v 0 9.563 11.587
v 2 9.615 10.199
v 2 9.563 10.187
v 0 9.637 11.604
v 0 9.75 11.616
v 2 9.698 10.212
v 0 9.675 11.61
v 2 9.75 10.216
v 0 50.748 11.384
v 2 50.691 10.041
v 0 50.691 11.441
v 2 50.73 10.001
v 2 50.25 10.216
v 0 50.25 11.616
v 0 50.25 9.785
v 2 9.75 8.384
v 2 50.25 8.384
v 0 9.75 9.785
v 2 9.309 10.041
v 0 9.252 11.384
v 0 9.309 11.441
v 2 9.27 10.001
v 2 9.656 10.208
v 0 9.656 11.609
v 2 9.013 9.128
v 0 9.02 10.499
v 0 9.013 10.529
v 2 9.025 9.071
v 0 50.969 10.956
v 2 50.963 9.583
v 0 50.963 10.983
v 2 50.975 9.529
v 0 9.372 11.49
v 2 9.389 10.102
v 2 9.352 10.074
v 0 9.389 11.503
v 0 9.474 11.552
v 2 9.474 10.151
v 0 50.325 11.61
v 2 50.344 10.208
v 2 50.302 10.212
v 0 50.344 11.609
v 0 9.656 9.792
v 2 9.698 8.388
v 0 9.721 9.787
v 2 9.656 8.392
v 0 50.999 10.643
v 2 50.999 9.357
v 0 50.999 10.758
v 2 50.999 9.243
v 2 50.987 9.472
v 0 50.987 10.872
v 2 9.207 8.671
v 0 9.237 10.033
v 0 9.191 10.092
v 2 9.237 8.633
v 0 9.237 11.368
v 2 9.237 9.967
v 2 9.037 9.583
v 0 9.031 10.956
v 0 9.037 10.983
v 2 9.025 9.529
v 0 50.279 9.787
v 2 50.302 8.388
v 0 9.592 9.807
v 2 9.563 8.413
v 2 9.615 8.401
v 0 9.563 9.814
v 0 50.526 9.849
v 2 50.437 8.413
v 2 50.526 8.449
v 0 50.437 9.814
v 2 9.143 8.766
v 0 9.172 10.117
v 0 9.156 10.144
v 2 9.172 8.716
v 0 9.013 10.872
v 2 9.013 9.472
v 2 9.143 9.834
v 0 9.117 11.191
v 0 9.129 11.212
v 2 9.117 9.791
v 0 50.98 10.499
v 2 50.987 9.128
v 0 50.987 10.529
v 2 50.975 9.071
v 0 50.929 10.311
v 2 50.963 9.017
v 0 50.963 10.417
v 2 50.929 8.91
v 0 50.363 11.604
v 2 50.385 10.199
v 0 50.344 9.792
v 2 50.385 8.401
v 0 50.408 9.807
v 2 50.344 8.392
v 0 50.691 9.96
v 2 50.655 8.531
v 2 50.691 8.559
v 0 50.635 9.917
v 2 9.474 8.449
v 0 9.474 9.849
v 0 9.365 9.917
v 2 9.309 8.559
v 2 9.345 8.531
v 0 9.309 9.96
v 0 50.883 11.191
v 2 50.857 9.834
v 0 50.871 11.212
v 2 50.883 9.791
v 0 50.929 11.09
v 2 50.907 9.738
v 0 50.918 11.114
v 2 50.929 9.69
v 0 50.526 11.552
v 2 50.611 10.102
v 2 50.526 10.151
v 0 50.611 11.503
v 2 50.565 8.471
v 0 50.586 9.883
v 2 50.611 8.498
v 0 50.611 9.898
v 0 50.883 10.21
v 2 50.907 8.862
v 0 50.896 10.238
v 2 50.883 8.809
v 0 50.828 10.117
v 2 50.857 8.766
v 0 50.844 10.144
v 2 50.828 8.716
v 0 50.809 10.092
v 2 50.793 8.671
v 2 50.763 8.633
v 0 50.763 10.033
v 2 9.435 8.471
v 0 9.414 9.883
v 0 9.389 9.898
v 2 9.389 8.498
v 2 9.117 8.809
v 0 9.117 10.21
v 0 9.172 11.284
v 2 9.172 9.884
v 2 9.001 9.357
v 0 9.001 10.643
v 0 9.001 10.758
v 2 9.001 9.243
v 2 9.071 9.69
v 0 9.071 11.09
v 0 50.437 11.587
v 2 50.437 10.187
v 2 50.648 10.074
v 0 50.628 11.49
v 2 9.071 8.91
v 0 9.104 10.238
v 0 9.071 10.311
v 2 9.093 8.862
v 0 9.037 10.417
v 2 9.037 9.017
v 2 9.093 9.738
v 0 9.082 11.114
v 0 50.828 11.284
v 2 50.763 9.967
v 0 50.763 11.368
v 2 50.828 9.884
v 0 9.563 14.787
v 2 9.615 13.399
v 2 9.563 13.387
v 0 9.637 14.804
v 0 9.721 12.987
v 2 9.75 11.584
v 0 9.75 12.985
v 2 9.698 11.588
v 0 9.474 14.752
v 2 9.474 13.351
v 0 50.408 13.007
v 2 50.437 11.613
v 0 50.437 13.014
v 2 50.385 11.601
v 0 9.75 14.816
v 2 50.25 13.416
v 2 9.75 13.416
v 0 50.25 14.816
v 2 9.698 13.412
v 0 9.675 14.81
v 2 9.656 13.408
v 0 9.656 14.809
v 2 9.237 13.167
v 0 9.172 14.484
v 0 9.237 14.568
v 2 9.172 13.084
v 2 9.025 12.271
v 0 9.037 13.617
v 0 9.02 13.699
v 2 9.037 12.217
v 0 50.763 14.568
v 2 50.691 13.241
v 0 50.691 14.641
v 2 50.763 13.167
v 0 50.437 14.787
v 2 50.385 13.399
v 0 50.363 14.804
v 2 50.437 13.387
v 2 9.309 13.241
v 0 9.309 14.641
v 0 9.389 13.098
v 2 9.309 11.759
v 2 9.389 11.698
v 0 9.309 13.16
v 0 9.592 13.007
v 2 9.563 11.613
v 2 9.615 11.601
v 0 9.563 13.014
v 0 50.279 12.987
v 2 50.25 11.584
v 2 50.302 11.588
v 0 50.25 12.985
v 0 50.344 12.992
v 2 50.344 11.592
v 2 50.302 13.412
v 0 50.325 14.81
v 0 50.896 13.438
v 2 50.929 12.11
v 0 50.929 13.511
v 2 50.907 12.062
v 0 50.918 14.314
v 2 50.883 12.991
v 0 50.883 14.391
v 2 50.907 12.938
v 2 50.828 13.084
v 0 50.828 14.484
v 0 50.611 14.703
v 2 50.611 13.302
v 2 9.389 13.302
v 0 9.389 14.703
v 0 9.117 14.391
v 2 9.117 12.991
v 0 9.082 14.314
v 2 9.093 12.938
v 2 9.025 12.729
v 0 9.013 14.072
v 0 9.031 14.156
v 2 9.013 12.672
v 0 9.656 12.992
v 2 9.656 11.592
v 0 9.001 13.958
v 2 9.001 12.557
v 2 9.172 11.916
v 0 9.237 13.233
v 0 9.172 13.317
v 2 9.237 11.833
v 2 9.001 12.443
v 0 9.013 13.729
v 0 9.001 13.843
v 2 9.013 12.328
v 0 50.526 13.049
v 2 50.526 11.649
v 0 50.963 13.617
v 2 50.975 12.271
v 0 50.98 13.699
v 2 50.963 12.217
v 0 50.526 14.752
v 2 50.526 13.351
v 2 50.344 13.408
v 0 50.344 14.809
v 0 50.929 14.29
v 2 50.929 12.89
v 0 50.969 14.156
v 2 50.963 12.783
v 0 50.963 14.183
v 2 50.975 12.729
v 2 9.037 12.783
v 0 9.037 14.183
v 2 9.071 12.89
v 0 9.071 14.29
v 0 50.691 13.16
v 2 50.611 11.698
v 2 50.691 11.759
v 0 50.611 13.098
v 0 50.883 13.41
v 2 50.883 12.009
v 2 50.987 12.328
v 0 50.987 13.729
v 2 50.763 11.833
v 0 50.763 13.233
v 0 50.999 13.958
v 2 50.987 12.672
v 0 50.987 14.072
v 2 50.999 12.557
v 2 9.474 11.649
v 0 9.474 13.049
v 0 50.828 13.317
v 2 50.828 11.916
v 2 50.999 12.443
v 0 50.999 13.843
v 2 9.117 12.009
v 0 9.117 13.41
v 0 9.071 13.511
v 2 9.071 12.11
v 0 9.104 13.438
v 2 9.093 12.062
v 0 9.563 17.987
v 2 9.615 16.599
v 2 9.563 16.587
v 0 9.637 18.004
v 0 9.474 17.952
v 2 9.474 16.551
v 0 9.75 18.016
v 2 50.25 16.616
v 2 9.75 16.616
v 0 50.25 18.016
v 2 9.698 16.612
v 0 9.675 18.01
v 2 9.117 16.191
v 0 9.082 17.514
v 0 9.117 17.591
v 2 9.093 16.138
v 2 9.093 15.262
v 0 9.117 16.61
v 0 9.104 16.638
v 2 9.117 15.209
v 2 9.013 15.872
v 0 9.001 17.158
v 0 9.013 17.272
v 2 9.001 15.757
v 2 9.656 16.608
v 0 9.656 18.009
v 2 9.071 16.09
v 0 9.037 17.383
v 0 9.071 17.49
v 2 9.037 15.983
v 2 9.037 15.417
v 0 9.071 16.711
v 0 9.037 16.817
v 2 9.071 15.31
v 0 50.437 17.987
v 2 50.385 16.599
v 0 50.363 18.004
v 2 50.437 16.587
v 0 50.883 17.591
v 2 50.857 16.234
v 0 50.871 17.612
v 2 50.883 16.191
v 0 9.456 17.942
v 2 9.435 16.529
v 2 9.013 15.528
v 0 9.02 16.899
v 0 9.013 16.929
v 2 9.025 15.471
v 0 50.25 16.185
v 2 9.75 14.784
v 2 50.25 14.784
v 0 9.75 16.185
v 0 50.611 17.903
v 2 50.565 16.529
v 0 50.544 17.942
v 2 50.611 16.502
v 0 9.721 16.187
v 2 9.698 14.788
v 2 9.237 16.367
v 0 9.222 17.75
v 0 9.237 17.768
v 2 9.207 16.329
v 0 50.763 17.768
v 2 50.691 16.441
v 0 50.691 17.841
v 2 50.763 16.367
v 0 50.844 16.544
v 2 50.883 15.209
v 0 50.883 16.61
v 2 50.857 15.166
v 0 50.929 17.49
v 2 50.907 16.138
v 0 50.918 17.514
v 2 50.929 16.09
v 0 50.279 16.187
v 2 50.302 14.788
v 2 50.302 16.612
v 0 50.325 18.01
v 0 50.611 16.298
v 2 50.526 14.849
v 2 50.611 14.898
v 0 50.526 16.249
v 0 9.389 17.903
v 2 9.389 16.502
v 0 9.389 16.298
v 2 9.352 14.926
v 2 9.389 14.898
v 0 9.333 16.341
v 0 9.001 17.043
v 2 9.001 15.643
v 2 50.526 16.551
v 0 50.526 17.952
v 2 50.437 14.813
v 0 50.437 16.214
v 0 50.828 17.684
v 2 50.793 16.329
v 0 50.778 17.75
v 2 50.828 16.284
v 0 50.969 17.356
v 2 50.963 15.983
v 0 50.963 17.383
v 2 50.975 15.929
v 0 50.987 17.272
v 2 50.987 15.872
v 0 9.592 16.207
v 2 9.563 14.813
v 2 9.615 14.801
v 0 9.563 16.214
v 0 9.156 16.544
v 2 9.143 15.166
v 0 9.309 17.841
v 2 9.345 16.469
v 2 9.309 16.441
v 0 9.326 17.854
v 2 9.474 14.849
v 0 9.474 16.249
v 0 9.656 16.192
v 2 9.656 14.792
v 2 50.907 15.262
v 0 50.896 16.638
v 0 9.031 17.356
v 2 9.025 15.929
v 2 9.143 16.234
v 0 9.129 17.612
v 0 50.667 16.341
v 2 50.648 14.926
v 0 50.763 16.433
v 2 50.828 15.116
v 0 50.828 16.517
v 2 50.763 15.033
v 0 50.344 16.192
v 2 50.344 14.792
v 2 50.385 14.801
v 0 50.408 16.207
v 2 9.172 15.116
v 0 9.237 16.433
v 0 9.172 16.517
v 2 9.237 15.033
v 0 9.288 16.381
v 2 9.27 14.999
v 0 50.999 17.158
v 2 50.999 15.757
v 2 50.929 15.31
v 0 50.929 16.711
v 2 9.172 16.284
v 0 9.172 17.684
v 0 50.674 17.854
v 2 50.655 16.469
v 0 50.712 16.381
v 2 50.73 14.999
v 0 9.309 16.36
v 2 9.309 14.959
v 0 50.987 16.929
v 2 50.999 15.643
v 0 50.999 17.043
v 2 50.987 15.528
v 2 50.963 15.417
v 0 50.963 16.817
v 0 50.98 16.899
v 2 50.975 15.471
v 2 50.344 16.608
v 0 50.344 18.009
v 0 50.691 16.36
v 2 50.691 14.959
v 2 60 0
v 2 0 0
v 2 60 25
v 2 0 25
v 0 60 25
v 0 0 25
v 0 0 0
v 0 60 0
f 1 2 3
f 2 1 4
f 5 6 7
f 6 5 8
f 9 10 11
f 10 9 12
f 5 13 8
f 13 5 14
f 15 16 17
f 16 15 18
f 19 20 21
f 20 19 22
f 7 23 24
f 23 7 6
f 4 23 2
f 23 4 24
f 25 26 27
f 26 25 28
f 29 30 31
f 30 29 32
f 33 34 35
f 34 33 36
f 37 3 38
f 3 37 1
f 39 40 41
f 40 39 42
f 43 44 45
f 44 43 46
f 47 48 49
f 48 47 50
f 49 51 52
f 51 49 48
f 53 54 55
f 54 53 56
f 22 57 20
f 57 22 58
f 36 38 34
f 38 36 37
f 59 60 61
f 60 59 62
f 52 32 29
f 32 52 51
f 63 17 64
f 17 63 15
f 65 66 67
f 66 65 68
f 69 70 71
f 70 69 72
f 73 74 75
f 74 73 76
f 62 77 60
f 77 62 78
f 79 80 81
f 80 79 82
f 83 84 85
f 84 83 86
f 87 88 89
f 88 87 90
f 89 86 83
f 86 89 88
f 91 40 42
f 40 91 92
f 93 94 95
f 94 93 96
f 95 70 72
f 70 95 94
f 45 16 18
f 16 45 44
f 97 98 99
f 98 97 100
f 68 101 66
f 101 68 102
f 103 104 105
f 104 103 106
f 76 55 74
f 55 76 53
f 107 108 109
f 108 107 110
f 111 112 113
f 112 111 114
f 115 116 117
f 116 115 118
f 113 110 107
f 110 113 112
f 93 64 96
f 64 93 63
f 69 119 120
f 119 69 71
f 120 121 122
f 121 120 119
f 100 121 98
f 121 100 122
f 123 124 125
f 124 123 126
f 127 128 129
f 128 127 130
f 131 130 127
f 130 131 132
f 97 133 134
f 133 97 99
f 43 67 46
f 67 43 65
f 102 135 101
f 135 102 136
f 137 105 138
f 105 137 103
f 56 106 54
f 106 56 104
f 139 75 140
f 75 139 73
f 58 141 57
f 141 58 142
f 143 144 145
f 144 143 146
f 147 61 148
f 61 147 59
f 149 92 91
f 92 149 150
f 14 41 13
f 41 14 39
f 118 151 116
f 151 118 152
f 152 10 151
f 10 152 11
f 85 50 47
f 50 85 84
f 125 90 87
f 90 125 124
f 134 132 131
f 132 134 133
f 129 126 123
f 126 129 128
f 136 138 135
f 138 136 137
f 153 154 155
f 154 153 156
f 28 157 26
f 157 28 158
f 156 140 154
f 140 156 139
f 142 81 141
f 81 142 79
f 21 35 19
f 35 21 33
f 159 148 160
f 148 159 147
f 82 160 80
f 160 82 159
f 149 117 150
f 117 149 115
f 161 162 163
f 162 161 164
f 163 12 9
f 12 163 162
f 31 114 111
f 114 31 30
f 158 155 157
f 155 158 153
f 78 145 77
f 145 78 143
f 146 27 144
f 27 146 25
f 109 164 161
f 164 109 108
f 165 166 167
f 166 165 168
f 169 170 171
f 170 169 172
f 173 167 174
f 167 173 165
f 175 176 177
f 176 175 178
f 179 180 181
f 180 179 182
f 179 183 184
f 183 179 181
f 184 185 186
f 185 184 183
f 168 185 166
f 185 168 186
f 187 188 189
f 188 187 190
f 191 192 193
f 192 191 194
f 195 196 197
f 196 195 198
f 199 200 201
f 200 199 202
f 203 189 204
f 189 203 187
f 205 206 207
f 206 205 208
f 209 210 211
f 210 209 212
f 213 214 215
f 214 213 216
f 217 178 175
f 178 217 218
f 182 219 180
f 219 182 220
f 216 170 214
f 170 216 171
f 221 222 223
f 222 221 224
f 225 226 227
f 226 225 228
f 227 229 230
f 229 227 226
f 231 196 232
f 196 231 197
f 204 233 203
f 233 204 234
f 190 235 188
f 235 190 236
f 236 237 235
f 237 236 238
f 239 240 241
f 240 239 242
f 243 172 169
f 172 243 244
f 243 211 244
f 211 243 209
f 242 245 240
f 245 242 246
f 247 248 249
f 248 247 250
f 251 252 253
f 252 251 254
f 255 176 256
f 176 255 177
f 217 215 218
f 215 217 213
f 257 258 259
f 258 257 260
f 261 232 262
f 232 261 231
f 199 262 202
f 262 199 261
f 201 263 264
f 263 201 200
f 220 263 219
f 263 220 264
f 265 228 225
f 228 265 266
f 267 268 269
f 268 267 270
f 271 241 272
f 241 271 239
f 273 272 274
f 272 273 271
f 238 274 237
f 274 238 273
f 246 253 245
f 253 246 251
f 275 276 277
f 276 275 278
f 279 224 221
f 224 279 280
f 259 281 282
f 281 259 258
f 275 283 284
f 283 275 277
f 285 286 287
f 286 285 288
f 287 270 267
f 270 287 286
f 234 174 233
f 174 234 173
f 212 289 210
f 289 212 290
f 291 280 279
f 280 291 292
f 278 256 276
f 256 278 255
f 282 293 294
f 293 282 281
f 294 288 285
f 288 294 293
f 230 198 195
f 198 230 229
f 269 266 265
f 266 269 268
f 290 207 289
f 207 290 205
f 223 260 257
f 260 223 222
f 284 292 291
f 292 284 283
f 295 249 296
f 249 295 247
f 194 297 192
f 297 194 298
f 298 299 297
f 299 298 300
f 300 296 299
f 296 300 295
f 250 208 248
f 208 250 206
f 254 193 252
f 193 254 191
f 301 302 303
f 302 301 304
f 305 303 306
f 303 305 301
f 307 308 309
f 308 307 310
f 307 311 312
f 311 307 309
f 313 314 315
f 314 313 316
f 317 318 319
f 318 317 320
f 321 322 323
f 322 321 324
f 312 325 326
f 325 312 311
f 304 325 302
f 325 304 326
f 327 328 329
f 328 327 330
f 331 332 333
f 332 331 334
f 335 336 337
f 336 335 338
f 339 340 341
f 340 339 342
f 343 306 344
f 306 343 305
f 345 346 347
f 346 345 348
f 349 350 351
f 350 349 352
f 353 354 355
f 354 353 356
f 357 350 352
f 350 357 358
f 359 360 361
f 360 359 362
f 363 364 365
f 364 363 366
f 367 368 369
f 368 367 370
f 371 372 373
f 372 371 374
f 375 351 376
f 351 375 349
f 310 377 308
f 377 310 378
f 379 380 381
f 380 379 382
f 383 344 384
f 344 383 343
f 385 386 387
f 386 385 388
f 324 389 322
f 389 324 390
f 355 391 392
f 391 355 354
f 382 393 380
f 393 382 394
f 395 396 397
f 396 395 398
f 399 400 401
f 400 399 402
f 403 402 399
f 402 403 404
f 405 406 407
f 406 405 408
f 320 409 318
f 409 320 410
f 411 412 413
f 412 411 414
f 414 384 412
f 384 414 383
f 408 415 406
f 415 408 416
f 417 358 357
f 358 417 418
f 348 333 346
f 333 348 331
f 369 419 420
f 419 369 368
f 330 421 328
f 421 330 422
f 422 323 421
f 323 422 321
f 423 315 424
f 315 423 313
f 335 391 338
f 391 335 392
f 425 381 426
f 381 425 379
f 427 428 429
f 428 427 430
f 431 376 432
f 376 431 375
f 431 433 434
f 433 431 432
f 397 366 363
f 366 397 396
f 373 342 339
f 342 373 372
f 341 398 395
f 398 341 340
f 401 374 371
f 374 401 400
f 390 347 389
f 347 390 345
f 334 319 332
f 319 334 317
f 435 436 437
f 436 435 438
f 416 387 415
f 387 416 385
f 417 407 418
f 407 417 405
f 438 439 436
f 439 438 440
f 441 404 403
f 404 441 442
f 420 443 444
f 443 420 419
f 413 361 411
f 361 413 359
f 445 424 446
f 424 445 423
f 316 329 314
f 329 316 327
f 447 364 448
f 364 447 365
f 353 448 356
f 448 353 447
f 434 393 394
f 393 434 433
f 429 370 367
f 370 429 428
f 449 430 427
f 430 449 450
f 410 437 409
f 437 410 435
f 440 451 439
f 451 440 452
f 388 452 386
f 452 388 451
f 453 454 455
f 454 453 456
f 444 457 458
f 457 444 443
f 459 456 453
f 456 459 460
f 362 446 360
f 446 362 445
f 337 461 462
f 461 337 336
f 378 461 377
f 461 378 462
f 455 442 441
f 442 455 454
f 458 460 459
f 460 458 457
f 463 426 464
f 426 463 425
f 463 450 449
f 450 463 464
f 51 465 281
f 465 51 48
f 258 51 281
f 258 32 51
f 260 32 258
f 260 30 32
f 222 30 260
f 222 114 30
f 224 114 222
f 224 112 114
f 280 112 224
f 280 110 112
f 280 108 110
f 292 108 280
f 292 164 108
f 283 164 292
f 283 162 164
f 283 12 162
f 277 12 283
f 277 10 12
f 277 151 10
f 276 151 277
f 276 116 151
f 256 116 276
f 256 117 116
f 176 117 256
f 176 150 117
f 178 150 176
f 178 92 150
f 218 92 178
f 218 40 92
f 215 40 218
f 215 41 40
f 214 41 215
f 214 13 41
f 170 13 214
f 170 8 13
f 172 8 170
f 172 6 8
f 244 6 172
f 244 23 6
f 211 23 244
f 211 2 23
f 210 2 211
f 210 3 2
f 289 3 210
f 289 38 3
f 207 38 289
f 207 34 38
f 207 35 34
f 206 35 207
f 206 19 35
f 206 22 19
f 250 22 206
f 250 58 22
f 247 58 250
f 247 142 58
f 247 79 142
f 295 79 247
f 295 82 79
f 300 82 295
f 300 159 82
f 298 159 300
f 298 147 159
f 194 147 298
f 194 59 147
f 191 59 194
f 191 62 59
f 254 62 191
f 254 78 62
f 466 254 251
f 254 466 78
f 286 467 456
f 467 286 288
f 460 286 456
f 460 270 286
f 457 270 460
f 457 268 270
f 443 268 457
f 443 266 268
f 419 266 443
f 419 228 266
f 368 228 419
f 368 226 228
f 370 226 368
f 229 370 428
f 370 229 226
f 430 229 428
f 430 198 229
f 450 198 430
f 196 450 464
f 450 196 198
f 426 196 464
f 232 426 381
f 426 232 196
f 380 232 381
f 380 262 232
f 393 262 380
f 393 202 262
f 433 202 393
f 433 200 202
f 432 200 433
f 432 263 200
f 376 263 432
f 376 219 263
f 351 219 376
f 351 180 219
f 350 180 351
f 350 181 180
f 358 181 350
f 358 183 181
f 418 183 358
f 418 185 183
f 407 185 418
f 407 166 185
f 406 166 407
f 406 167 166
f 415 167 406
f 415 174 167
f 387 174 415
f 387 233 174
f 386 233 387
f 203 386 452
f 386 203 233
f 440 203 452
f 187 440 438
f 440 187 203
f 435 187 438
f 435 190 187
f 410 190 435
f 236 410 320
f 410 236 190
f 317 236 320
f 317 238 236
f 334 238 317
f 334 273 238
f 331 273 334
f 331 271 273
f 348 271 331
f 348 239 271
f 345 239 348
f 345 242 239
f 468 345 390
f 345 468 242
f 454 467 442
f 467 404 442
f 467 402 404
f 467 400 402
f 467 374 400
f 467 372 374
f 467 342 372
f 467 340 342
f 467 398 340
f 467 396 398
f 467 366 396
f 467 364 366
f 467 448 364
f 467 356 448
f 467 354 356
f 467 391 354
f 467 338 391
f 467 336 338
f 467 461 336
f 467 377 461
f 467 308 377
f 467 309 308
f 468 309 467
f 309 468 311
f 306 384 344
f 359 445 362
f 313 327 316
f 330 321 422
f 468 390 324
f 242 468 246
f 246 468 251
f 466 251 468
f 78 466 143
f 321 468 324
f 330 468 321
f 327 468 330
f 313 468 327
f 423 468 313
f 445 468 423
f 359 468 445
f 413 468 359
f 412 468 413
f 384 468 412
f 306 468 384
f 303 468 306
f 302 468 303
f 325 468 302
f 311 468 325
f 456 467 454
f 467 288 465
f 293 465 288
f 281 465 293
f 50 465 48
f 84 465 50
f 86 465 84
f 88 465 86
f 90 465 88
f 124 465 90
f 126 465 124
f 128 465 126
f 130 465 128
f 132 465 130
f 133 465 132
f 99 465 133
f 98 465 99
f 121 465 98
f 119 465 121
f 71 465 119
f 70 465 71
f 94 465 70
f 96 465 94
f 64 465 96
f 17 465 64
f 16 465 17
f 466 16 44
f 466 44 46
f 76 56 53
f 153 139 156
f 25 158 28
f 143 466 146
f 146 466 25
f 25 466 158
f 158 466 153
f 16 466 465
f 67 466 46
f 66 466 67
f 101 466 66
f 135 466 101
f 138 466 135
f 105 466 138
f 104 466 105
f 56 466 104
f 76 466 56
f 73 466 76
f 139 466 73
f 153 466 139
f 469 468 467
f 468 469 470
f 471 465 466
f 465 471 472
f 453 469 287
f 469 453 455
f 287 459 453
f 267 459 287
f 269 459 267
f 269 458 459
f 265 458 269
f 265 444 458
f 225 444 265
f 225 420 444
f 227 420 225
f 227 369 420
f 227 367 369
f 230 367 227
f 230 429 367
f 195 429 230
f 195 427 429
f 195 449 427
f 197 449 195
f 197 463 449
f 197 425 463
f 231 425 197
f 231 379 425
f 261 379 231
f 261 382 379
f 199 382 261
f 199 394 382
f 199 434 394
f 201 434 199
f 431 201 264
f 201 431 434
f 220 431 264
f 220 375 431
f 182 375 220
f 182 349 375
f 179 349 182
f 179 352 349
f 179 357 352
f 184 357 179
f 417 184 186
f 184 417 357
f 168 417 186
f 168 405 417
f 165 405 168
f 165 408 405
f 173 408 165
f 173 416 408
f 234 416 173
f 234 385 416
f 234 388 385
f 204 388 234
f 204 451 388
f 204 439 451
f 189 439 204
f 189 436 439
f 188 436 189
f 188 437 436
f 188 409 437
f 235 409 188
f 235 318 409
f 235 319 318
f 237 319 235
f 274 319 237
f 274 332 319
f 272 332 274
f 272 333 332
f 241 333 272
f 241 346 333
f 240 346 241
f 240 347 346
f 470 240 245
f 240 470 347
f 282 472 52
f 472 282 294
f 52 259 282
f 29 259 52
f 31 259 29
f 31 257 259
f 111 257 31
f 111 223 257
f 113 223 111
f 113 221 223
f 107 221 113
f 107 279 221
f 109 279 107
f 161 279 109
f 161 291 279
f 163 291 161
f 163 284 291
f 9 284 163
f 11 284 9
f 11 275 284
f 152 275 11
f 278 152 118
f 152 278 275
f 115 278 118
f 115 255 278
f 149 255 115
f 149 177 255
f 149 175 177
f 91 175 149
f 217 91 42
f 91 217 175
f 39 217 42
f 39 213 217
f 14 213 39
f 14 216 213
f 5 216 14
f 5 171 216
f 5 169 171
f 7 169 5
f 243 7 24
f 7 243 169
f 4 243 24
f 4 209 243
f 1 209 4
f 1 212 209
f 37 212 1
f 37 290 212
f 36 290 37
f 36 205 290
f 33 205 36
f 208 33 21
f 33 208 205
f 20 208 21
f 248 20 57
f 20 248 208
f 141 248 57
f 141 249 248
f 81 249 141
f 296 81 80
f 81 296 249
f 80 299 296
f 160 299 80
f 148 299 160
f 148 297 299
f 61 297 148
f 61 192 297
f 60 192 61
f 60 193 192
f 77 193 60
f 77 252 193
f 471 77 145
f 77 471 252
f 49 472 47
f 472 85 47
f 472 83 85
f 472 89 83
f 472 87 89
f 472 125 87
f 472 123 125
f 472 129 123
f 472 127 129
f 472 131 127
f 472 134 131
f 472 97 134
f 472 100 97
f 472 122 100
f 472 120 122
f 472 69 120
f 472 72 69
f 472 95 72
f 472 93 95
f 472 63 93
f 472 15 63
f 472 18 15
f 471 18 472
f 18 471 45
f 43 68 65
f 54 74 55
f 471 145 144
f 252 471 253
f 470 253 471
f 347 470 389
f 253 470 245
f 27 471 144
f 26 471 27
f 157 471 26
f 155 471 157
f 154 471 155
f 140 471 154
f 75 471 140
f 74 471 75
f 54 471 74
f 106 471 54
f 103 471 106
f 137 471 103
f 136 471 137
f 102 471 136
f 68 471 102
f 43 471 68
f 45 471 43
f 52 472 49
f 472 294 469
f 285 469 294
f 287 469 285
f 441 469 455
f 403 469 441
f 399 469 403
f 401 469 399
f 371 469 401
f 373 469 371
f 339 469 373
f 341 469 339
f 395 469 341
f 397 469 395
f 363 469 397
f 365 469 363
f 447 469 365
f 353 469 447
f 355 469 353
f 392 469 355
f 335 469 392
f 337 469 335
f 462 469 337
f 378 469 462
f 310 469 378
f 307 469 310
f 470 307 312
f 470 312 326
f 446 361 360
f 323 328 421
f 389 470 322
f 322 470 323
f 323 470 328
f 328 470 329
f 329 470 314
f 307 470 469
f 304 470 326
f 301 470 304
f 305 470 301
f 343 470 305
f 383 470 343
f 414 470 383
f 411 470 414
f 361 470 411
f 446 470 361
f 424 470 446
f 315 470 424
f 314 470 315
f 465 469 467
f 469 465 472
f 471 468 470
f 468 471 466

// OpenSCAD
$fn = 50;

wall_t = 2.0;

module horizontal_louver_grille(length=42.0, num_slots=3, slot_h=1.5, pitch=3.2, louver_angle=40) {
    total_h = (num_slots - 1) * pitch + slot_h;
    
    // 1. Recessed Architectural Bezel (0.7mm shallow frame)
    translate([0, 0, 0])
        rotate([0, 90, 0])
        hull() {
            r = 1.8;
            translate([-total_h/2 - 1.0 + r, -length/2 - 1.2 + r]) circle(r=r);
            translate([ total_h/2 + 1.0 - r, -length/2 - 1.2 + r]) circle(r=r);
            translate([ total_h/2 + 1.0 - r,  length/2 + 1.2 - r]) circle(r=r);
            translate([-total_h/2 - 1.0 + r,  length/2 + 1.2 - r]) circle(r=r);
        }

    // 2. Horizontal Louver Slots (Horizontal along Y, angled downward through the wall X)
    for (i = [0 : num_slots - 1]) {
        z_pos = -total_h/2 + slot_h/2 + i * pitch;
        translate([0, 0, z_pos])
            rotate([0, louver_angle, 0]) // Angled through wall thickness!
            rotate([0, 90, 0])
            hull() {
                translate([0, -length/2 + slot_h/2]) cylinder(d=slot_h, h=10, center=true);
                translate([0,  length/2 - slot_h/2]) cylinder(d=slot_h, h=10, center=true);
            }
    }
}

difference() {
    cube([wall_t, 60, 25]);
    translate([wall_t, 30, 12.5])
        horizontal_louver_grille(length=42.0, num_slots=3, slot_h=1.5, pitch=3.2, louver_angle=35);
}
